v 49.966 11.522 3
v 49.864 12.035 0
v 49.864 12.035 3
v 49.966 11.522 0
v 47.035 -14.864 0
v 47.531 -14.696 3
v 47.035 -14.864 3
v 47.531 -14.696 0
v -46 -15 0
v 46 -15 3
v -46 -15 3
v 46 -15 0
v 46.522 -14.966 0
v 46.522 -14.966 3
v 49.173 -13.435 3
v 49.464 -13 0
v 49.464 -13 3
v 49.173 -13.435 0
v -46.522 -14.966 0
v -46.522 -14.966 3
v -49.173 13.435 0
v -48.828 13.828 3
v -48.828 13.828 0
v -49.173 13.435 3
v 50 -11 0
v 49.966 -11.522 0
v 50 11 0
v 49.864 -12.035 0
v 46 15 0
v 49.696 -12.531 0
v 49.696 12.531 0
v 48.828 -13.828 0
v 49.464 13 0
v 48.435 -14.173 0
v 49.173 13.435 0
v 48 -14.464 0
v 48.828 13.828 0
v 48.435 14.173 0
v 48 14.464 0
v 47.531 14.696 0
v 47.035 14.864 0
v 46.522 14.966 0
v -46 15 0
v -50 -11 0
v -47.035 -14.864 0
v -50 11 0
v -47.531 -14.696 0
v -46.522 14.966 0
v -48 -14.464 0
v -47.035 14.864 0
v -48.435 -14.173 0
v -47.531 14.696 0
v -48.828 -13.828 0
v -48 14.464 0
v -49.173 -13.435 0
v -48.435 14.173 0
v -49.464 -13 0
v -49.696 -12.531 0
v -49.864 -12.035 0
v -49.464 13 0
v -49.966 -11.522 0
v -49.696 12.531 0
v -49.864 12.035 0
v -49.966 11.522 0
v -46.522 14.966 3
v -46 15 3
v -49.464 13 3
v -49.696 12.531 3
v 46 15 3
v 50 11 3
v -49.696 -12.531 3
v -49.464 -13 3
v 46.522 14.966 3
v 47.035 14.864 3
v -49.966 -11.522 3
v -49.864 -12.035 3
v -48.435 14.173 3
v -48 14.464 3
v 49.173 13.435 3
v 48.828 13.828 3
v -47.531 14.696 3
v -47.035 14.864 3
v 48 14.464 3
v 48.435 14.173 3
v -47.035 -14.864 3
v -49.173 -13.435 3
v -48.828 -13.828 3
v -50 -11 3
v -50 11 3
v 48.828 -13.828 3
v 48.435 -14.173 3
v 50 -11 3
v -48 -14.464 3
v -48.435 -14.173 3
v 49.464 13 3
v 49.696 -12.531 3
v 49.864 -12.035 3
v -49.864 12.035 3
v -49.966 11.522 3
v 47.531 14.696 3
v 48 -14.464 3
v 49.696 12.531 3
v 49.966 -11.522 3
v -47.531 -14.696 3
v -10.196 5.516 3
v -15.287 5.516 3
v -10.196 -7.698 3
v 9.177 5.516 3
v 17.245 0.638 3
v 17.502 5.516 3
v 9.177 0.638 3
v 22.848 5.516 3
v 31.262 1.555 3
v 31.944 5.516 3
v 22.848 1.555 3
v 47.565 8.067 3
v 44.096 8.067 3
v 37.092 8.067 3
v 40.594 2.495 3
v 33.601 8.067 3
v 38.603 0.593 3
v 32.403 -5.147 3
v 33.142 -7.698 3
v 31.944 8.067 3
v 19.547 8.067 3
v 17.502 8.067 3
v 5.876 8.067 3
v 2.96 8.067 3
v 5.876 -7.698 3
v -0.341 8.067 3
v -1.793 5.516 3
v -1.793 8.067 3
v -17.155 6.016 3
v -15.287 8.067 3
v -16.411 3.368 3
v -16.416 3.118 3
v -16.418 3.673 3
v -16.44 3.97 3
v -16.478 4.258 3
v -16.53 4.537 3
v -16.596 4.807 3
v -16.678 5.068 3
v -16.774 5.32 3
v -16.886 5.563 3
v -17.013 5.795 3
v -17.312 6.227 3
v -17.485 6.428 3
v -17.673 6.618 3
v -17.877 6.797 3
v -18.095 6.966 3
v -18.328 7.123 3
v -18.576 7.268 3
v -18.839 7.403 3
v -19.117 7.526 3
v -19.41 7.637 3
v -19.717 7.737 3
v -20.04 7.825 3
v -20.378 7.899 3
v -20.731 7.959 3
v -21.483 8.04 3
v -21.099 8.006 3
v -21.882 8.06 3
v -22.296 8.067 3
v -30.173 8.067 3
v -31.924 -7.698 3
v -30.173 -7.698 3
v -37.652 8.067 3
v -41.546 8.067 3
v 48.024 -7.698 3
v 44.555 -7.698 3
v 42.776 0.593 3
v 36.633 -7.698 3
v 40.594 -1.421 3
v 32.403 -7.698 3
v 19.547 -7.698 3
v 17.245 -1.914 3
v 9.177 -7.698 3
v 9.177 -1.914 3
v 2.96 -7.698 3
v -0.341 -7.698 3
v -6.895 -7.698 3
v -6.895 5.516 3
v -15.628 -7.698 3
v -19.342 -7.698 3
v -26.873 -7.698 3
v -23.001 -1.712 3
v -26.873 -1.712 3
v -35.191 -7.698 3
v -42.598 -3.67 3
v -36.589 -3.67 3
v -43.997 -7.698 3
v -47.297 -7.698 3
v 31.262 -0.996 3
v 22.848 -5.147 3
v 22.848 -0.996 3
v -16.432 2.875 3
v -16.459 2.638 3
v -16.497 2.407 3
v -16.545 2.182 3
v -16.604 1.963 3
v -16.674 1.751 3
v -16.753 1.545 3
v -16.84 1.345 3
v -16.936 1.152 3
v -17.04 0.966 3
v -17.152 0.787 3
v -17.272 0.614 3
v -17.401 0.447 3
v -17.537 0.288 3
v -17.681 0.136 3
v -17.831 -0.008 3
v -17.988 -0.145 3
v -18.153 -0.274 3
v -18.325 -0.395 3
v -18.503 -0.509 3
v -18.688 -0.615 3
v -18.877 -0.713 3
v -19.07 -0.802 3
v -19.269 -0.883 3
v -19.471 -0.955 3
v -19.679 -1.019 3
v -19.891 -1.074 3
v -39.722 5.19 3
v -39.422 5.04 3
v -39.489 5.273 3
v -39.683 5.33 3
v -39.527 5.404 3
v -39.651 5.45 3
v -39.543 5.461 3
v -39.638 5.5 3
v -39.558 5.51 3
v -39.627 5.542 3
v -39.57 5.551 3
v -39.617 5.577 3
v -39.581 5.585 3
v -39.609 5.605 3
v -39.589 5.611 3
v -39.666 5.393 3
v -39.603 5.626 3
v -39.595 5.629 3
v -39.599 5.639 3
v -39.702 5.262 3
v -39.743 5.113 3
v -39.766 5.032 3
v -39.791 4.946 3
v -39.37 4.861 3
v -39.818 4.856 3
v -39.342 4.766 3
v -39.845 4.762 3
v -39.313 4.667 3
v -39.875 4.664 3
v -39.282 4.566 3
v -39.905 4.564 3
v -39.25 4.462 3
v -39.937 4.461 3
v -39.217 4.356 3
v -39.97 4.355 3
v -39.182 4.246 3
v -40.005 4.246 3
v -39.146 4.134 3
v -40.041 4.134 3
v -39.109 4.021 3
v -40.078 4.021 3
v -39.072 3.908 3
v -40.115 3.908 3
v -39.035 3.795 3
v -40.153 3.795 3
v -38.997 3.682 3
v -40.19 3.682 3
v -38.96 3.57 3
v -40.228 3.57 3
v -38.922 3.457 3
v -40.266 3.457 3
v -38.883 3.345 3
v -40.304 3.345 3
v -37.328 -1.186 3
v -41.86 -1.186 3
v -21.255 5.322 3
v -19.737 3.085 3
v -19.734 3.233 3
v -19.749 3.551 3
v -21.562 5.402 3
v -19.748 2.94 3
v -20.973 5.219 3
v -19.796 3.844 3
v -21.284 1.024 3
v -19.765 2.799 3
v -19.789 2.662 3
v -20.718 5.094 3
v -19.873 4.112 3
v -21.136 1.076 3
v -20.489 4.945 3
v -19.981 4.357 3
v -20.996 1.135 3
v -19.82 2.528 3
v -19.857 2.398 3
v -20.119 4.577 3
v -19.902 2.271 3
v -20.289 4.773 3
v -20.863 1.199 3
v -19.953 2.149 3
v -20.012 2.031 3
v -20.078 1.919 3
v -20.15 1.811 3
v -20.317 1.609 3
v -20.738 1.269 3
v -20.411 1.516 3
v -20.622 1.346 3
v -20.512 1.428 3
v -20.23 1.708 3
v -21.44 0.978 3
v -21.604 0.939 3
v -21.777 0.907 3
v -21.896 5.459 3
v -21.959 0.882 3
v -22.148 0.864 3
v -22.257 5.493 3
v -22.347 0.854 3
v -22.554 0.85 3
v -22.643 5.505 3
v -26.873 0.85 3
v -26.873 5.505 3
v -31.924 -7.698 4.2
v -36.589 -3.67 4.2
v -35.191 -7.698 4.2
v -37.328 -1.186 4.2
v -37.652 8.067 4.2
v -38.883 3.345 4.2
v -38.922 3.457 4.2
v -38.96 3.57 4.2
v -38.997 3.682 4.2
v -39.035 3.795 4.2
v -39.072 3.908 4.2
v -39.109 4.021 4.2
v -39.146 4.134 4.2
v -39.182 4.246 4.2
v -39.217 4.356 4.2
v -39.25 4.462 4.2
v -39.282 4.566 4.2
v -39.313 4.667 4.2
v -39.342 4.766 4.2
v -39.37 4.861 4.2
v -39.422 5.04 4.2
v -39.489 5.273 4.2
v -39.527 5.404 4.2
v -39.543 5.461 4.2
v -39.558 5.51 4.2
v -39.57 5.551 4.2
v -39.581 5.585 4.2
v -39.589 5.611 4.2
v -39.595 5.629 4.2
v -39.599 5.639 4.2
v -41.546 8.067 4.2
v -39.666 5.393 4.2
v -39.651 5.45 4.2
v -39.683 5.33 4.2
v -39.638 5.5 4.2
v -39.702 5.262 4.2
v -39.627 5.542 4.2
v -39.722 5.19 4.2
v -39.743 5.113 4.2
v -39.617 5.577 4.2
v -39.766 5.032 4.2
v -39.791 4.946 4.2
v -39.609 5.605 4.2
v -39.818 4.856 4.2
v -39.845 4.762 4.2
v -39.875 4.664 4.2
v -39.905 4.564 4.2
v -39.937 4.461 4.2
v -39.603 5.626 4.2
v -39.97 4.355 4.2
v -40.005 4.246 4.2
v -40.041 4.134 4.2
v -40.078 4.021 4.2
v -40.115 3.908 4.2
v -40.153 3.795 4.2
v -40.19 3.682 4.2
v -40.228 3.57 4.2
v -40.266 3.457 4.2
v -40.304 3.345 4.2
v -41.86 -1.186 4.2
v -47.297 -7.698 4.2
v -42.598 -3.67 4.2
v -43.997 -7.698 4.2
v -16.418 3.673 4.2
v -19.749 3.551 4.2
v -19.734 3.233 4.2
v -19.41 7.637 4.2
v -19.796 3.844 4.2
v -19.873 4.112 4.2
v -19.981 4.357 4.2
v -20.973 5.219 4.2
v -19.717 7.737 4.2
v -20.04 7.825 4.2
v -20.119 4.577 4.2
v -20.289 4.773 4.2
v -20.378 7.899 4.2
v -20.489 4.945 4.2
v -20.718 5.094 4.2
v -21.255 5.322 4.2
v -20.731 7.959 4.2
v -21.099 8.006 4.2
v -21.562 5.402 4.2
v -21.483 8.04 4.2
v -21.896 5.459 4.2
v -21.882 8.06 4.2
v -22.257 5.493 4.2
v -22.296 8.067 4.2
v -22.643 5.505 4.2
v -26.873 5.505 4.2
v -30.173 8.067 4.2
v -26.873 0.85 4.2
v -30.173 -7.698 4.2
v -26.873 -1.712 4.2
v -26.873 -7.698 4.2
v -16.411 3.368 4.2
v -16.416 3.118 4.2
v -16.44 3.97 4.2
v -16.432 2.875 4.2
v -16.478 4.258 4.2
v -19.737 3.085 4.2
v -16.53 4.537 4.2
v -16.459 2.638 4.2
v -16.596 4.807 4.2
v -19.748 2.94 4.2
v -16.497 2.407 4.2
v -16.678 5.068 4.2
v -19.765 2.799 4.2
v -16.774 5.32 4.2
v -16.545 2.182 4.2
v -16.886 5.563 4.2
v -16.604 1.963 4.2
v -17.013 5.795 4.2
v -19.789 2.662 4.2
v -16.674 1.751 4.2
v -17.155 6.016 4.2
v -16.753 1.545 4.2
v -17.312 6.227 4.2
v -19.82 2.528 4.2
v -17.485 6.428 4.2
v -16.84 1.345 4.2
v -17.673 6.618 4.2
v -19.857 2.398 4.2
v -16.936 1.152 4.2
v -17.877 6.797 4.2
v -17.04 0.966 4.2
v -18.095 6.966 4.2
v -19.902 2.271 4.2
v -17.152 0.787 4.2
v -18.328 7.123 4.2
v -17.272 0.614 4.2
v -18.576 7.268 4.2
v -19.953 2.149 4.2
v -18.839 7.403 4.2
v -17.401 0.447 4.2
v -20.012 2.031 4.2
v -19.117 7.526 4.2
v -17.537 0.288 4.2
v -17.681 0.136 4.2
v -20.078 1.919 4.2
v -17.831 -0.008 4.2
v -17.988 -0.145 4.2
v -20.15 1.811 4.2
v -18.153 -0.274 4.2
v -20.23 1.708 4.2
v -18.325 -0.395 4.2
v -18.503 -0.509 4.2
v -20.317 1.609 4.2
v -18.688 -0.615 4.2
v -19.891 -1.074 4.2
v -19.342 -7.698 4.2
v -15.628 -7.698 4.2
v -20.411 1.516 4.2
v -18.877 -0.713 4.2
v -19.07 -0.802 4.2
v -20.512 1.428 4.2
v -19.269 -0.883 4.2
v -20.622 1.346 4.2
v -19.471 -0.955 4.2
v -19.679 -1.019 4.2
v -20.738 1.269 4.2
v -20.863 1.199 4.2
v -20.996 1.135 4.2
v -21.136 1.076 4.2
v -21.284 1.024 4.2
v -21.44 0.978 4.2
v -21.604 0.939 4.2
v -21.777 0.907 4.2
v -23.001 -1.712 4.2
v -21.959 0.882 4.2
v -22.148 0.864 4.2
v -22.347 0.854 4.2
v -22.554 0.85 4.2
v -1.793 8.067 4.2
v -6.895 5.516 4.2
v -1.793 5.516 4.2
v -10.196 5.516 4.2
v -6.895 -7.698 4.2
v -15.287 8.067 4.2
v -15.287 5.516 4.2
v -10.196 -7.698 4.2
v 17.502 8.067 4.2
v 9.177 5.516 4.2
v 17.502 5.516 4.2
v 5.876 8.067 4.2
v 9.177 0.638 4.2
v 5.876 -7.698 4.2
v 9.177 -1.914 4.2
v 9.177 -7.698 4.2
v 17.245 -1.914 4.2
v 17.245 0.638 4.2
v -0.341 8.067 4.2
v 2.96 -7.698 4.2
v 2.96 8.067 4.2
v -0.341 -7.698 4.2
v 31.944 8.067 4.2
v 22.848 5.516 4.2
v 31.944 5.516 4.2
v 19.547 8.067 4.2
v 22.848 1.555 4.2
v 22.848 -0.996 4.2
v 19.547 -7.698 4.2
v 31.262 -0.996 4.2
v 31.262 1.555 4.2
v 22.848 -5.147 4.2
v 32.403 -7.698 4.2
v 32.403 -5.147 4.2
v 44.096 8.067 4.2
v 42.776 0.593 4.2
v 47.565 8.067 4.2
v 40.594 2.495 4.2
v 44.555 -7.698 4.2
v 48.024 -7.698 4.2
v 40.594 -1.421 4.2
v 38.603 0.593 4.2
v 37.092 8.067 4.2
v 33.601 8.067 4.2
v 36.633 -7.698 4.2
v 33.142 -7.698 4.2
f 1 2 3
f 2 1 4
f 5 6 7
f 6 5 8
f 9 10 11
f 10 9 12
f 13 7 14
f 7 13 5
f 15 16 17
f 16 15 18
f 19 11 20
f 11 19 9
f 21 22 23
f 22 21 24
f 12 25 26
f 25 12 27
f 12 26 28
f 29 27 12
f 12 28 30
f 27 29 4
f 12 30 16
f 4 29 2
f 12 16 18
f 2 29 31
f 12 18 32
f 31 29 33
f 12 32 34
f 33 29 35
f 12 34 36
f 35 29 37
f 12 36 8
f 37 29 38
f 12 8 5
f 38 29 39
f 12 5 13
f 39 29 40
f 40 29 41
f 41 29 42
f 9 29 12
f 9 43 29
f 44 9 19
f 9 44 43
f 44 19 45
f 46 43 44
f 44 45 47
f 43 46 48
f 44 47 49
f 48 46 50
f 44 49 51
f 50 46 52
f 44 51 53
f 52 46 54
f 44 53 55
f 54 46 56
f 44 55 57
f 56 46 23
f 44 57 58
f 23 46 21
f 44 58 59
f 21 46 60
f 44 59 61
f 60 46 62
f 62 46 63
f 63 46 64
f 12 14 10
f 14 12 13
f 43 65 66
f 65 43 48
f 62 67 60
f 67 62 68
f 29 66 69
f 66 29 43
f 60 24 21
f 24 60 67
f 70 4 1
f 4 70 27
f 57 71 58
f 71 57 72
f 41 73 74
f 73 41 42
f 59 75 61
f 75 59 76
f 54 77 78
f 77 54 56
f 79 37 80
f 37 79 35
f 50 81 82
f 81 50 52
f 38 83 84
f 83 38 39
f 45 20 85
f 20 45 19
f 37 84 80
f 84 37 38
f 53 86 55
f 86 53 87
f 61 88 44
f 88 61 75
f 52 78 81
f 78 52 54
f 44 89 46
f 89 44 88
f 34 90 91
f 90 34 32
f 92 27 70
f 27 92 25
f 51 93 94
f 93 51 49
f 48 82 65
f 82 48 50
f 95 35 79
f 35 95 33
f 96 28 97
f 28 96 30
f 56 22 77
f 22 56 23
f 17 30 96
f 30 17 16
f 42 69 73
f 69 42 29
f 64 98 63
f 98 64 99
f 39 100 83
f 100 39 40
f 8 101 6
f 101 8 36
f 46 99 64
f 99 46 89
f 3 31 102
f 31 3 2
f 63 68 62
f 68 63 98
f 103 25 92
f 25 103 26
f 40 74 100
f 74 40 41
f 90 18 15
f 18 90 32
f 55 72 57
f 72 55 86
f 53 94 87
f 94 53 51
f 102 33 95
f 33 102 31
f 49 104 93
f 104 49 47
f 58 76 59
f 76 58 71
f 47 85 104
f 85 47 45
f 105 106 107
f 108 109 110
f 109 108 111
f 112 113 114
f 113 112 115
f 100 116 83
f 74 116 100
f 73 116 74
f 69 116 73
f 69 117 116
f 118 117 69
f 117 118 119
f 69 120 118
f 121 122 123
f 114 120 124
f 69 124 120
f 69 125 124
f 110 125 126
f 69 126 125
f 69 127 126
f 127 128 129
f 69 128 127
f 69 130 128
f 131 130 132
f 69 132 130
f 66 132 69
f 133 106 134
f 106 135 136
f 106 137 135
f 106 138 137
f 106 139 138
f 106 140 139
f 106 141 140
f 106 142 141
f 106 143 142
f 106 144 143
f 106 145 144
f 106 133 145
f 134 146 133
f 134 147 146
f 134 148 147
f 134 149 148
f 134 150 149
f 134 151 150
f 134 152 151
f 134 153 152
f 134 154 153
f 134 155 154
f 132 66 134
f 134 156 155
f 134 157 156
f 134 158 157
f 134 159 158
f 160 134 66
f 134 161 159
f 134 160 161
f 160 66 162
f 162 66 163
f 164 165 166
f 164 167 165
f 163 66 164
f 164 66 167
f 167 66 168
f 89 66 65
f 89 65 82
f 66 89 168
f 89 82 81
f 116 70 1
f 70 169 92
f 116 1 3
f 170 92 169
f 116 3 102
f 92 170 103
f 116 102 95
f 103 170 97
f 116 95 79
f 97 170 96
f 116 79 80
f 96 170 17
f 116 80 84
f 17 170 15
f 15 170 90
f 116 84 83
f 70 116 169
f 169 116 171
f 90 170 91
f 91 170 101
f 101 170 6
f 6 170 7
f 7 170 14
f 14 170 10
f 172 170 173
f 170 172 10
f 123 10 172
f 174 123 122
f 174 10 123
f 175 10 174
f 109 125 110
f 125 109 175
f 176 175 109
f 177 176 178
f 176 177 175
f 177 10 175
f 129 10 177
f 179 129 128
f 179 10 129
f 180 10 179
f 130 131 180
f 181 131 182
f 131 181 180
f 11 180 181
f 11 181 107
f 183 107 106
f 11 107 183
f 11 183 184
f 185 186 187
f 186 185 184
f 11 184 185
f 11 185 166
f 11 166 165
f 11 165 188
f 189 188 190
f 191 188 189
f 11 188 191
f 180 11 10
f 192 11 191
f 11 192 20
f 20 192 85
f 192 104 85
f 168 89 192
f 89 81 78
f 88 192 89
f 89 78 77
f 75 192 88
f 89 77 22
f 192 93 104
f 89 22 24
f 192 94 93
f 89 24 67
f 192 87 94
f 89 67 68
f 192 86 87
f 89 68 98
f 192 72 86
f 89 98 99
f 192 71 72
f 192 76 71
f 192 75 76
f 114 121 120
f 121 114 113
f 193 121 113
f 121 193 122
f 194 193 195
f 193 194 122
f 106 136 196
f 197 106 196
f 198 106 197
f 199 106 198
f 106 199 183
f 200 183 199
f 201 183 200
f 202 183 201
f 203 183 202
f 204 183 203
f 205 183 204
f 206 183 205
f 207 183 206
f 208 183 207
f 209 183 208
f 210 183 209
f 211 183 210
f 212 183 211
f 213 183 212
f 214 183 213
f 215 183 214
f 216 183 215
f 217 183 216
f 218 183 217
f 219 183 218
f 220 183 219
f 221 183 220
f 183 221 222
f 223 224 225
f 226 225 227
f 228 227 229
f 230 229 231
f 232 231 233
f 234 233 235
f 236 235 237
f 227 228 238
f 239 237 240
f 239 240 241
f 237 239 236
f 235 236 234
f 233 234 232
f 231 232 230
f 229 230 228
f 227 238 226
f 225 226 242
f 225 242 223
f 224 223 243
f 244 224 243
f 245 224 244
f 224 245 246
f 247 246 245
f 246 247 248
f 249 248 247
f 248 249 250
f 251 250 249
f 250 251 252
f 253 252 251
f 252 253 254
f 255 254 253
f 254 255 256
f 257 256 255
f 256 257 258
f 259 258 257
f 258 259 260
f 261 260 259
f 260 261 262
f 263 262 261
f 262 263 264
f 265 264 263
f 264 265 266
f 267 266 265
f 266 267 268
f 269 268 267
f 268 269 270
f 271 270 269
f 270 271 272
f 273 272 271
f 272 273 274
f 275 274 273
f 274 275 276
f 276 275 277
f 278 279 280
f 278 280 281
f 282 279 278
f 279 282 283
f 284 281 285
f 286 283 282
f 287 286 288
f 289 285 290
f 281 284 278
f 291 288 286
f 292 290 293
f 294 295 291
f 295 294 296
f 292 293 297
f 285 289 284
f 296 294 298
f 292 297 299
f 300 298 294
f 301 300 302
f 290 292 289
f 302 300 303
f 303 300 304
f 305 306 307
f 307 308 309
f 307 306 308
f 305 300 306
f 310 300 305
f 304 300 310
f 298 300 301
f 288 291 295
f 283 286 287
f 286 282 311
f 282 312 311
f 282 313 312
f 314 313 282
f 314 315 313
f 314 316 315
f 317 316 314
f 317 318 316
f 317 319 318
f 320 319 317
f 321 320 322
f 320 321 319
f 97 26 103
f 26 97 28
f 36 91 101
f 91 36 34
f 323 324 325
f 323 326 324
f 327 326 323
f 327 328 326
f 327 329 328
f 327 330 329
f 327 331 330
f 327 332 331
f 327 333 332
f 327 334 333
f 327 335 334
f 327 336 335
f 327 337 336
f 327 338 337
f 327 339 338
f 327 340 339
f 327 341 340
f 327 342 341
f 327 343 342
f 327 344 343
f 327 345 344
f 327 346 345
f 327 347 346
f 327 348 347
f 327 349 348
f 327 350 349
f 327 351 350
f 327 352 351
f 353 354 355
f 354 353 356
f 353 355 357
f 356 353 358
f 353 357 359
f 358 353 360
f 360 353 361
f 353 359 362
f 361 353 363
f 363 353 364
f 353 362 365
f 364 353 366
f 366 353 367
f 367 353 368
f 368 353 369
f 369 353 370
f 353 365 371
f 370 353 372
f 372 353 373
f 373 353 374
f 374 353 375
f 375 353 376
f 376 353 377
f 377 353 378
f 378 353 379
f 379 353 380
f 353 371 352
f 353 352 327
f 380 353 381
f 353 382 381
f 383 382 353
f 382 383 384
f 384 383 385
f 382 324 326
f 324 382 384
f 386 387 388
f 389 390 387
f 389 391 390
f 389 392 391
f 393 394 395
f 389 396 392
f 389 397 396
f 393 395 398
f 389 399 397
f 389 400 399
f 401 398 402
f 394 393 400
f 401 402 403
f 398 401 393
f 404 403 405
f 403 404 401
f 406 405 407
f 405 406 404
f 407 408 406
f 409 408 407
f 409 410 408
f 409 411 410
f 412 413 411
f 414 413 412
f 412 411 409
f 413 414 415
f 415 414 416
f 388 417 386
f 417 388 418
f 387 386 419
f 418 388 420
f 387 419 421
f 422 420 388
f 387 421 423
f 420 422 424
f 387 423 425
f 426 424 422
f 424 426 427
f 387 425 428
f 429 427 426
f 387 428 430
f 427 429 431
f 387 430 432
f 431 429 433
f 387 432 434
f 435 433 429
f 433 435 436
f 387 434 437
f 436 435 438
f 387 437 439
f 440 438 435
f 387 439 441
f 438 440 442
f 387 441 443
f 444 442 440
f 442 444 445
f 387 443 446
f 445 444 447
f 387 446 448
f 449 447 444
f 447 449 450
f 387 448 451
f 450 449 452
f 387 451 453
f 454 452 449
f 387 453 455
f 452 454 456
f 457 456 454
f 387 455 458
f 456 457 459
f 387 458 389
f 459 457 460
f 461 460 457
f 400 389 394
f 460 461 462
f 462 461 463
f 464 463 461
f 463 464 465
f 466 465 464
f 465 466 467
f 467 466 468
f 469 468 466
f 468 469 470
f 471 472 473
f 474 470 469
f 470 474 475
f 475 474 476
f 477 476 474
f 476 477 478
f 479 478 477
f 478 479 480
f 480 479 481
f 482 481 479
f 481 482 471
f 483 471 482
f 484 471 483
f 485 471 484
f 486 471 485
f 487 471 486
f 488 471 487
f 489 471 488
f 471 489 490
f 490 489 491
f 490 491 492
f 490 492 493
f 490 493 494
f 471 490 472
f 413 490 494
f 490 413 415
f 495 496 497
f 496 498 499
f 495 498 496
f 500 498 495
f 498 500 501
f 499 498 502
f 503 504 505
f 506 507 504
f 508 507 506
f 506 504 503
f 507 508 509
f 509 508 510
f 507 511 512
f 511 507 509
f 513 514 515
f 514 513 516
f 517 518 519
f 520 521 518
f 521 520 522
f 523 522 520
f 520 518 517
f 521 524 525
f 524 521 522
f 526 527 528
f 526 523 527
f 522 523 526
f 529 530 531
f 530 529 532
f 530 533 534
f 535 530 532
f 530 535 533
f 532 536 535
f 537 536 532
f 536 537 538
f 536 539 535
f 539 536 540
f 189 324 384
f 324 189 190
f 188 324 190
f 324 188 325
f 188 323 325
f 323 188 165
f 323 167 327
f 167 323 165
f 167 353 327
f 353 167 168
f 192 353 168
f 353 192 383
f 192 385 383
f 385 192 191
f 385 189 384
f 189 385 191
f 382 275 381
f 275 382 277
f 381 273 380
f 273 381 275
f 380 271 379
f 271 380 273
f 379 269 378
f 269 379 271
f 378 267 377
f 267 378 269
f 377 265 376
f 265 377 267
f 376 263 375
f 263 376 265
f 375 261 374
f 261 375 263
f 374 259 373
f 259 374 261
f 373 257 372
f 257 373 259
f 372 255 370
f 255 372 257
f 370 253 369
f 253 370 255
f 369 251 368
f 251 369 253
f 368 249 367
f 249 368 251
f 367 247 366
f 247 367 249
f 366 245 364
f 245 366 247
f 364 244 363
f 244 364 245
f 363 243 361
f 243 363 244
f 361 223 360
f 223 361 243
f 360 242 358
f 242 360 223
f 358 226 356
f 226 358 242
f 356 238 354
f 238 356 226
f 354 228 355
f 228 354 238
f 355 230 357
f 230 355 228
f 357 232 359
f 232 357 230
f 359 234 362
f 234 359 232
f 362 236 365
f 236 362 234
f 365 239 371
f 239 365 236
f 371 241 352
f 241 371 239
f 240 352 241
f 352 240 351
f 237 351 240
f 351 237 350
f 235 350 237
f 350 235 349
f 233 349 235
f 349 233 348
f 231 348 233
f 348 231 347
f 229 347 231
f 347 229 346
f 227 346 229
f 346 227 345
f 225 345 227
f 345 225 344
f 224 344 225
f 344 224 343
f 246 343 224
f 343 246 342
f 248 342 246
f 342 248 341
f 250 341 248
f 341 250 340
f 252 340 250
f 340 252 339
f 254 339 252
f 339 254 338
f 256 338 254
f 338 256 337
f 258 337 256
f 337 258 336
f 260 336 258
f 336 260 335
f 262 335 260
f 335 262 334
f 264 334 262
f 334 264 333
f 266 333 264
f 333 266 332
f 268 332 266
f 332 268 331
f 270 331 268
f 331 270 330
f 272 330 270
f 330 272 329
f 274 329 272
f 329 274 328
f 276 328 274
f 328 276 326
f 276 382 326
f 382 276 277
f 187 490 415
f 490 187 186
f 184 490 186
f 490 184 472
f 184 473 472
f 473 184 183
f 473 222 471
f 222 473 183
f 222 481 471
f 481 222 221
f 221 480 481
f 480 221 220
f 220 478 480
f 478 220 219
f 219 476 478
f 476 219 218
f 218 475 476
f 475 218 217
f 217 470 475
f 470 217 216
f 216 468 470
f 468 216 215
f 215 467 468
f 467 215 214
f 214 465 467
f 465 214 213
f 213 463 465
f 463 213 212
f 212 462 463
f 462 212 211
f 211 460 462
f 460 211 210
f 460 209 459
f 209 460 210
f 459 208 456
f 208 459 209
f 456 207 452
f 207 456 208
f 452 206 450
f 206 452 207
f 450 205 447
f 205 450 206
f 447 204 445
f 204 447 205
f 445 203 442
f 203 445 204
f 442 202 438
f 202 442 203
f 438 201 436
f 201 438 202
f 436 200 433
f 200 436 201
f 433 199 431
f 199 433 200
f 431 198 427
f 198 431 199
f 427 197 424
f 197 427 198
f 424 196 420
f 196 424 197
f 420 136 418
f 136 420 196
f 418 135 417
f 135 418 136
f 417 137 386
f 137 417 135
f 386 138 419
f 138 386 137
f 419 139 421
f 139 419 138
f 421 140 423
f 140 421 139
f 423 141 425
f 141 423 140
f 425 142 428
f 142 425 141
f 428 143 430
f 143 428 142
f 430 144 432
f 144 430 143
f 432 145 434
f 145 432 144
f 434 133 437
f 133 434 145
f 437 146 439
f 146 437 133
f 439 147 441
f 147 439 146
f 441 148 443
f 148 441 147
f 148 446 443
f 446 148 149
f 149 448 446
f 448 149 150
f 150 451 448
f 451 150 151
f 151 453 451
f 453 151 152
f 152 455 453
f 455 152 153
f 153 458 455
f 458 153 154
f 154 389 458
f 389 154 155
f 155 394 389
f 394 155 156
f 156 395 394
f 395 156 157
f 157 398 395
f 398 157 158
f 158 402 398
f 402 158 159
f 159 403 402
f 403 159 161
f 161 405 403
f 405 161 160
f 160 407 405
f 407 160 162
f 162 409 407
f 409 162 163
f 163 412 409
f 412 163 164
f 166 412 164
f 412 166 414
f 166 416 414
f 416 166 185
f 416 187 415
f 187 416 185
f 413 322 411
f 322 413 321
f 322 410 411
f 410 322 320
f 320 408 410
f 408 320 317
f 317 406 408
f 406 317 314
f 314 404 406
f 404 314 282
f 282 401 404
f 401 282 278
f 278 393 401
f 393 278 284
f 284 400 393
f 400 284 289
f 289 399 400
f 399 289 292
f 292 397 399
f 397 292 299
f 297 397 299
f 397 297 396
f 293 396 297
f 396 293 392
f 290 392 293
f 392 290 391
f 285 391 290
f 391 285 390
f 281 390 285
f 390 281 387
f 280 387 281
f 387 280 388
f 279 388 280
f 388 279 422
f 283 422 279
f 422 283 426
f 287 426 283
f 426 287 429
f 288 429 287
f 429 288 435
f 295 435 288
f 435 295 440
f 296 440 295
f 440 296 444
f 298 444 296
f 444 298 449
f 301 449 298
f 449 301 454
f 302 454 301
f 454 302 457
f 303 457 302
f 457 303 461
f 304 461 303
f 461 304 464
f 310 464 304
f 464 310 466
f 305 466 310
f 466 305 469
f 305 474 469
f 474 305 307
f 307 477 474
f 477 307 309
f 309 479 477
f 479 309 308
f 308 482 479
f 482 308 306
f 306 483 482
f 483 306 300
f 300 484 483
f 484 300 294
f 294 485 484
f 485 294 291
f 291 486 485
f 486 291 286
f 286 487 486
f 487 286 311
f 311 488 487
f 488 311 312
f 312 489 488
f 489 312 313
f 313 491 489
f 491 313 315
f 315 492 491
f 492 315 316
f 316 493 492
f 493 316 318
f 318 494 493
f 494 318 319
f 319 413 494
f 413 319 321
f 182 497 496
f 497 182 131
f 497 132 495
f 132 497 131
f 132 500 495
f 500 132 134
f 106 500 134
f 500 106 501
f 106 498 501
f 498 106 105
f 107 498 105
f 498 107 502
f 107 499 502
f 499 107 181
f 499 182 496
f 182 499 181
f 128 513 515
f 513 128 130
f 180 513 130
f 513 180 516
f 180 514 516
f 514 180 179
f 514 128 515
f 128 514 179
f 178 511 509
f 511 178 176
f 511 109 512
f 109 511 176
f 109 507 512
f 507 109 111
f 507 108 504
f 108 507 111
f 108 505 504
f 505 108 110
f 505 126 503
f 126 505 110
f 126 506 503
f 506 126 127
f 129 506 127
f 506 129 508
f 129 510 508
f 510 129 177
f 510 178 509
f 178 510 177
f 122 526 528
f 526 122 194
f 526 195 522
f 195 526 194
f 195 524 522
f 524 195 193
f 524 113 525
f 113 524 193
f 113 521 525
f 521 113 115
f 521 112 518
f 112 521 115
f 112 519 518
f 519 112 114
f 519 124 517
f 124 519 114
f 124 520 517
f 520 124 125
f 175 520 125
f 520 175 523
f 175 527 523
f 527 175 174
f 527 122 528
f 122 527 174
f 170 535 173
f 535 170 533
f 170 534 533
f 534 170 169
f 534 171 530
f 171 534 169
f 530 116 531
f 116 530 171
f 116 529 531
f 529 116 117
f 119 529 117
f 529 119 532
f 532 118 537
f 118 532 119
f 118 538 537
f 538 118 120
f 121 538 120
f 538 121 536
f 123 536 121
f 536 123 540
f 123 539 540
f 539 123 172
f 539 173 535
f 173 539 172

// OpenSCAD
// ARTIFEX template: sign / name plate / key tag with raised text
label = "ARTIFEX";
width = 100;
height = 30;
thickness = 3;
text_height = 1.2;
text_size = 0;      // 0 = automatic
corner_r = 4;
hole_d = 0;         // > 0 adds a hole on the left (key tag)
$fn = 48;

hole_space = hole_d > 0 ? hole_d + 4 : 0;
auto_size = min(height * 0.55, (width - hole_space - 6) / max(len(label), 1) * 1.35);
ts = text_size > 0 ? text_size : auto_size;

union() {
    difference() {
        linear_extrude(thickness)
            offset(r = corner_r) square([width - 2 * corner_r, height - 2 * corner_r], center = true);
        if (hole_d > 0)
            translate([-width / 2 + hole_d / 2 + 3, 0, -1]) cylinder(d = hole_d, h = thickness + 2);
    }
    translate([hole_space / 2, 0, thickness])
        linear_extrude(text_height)
            text(label, size = ts, font = "Liberation Sans:style=Bold", halign = "center", valign = "center");
}
